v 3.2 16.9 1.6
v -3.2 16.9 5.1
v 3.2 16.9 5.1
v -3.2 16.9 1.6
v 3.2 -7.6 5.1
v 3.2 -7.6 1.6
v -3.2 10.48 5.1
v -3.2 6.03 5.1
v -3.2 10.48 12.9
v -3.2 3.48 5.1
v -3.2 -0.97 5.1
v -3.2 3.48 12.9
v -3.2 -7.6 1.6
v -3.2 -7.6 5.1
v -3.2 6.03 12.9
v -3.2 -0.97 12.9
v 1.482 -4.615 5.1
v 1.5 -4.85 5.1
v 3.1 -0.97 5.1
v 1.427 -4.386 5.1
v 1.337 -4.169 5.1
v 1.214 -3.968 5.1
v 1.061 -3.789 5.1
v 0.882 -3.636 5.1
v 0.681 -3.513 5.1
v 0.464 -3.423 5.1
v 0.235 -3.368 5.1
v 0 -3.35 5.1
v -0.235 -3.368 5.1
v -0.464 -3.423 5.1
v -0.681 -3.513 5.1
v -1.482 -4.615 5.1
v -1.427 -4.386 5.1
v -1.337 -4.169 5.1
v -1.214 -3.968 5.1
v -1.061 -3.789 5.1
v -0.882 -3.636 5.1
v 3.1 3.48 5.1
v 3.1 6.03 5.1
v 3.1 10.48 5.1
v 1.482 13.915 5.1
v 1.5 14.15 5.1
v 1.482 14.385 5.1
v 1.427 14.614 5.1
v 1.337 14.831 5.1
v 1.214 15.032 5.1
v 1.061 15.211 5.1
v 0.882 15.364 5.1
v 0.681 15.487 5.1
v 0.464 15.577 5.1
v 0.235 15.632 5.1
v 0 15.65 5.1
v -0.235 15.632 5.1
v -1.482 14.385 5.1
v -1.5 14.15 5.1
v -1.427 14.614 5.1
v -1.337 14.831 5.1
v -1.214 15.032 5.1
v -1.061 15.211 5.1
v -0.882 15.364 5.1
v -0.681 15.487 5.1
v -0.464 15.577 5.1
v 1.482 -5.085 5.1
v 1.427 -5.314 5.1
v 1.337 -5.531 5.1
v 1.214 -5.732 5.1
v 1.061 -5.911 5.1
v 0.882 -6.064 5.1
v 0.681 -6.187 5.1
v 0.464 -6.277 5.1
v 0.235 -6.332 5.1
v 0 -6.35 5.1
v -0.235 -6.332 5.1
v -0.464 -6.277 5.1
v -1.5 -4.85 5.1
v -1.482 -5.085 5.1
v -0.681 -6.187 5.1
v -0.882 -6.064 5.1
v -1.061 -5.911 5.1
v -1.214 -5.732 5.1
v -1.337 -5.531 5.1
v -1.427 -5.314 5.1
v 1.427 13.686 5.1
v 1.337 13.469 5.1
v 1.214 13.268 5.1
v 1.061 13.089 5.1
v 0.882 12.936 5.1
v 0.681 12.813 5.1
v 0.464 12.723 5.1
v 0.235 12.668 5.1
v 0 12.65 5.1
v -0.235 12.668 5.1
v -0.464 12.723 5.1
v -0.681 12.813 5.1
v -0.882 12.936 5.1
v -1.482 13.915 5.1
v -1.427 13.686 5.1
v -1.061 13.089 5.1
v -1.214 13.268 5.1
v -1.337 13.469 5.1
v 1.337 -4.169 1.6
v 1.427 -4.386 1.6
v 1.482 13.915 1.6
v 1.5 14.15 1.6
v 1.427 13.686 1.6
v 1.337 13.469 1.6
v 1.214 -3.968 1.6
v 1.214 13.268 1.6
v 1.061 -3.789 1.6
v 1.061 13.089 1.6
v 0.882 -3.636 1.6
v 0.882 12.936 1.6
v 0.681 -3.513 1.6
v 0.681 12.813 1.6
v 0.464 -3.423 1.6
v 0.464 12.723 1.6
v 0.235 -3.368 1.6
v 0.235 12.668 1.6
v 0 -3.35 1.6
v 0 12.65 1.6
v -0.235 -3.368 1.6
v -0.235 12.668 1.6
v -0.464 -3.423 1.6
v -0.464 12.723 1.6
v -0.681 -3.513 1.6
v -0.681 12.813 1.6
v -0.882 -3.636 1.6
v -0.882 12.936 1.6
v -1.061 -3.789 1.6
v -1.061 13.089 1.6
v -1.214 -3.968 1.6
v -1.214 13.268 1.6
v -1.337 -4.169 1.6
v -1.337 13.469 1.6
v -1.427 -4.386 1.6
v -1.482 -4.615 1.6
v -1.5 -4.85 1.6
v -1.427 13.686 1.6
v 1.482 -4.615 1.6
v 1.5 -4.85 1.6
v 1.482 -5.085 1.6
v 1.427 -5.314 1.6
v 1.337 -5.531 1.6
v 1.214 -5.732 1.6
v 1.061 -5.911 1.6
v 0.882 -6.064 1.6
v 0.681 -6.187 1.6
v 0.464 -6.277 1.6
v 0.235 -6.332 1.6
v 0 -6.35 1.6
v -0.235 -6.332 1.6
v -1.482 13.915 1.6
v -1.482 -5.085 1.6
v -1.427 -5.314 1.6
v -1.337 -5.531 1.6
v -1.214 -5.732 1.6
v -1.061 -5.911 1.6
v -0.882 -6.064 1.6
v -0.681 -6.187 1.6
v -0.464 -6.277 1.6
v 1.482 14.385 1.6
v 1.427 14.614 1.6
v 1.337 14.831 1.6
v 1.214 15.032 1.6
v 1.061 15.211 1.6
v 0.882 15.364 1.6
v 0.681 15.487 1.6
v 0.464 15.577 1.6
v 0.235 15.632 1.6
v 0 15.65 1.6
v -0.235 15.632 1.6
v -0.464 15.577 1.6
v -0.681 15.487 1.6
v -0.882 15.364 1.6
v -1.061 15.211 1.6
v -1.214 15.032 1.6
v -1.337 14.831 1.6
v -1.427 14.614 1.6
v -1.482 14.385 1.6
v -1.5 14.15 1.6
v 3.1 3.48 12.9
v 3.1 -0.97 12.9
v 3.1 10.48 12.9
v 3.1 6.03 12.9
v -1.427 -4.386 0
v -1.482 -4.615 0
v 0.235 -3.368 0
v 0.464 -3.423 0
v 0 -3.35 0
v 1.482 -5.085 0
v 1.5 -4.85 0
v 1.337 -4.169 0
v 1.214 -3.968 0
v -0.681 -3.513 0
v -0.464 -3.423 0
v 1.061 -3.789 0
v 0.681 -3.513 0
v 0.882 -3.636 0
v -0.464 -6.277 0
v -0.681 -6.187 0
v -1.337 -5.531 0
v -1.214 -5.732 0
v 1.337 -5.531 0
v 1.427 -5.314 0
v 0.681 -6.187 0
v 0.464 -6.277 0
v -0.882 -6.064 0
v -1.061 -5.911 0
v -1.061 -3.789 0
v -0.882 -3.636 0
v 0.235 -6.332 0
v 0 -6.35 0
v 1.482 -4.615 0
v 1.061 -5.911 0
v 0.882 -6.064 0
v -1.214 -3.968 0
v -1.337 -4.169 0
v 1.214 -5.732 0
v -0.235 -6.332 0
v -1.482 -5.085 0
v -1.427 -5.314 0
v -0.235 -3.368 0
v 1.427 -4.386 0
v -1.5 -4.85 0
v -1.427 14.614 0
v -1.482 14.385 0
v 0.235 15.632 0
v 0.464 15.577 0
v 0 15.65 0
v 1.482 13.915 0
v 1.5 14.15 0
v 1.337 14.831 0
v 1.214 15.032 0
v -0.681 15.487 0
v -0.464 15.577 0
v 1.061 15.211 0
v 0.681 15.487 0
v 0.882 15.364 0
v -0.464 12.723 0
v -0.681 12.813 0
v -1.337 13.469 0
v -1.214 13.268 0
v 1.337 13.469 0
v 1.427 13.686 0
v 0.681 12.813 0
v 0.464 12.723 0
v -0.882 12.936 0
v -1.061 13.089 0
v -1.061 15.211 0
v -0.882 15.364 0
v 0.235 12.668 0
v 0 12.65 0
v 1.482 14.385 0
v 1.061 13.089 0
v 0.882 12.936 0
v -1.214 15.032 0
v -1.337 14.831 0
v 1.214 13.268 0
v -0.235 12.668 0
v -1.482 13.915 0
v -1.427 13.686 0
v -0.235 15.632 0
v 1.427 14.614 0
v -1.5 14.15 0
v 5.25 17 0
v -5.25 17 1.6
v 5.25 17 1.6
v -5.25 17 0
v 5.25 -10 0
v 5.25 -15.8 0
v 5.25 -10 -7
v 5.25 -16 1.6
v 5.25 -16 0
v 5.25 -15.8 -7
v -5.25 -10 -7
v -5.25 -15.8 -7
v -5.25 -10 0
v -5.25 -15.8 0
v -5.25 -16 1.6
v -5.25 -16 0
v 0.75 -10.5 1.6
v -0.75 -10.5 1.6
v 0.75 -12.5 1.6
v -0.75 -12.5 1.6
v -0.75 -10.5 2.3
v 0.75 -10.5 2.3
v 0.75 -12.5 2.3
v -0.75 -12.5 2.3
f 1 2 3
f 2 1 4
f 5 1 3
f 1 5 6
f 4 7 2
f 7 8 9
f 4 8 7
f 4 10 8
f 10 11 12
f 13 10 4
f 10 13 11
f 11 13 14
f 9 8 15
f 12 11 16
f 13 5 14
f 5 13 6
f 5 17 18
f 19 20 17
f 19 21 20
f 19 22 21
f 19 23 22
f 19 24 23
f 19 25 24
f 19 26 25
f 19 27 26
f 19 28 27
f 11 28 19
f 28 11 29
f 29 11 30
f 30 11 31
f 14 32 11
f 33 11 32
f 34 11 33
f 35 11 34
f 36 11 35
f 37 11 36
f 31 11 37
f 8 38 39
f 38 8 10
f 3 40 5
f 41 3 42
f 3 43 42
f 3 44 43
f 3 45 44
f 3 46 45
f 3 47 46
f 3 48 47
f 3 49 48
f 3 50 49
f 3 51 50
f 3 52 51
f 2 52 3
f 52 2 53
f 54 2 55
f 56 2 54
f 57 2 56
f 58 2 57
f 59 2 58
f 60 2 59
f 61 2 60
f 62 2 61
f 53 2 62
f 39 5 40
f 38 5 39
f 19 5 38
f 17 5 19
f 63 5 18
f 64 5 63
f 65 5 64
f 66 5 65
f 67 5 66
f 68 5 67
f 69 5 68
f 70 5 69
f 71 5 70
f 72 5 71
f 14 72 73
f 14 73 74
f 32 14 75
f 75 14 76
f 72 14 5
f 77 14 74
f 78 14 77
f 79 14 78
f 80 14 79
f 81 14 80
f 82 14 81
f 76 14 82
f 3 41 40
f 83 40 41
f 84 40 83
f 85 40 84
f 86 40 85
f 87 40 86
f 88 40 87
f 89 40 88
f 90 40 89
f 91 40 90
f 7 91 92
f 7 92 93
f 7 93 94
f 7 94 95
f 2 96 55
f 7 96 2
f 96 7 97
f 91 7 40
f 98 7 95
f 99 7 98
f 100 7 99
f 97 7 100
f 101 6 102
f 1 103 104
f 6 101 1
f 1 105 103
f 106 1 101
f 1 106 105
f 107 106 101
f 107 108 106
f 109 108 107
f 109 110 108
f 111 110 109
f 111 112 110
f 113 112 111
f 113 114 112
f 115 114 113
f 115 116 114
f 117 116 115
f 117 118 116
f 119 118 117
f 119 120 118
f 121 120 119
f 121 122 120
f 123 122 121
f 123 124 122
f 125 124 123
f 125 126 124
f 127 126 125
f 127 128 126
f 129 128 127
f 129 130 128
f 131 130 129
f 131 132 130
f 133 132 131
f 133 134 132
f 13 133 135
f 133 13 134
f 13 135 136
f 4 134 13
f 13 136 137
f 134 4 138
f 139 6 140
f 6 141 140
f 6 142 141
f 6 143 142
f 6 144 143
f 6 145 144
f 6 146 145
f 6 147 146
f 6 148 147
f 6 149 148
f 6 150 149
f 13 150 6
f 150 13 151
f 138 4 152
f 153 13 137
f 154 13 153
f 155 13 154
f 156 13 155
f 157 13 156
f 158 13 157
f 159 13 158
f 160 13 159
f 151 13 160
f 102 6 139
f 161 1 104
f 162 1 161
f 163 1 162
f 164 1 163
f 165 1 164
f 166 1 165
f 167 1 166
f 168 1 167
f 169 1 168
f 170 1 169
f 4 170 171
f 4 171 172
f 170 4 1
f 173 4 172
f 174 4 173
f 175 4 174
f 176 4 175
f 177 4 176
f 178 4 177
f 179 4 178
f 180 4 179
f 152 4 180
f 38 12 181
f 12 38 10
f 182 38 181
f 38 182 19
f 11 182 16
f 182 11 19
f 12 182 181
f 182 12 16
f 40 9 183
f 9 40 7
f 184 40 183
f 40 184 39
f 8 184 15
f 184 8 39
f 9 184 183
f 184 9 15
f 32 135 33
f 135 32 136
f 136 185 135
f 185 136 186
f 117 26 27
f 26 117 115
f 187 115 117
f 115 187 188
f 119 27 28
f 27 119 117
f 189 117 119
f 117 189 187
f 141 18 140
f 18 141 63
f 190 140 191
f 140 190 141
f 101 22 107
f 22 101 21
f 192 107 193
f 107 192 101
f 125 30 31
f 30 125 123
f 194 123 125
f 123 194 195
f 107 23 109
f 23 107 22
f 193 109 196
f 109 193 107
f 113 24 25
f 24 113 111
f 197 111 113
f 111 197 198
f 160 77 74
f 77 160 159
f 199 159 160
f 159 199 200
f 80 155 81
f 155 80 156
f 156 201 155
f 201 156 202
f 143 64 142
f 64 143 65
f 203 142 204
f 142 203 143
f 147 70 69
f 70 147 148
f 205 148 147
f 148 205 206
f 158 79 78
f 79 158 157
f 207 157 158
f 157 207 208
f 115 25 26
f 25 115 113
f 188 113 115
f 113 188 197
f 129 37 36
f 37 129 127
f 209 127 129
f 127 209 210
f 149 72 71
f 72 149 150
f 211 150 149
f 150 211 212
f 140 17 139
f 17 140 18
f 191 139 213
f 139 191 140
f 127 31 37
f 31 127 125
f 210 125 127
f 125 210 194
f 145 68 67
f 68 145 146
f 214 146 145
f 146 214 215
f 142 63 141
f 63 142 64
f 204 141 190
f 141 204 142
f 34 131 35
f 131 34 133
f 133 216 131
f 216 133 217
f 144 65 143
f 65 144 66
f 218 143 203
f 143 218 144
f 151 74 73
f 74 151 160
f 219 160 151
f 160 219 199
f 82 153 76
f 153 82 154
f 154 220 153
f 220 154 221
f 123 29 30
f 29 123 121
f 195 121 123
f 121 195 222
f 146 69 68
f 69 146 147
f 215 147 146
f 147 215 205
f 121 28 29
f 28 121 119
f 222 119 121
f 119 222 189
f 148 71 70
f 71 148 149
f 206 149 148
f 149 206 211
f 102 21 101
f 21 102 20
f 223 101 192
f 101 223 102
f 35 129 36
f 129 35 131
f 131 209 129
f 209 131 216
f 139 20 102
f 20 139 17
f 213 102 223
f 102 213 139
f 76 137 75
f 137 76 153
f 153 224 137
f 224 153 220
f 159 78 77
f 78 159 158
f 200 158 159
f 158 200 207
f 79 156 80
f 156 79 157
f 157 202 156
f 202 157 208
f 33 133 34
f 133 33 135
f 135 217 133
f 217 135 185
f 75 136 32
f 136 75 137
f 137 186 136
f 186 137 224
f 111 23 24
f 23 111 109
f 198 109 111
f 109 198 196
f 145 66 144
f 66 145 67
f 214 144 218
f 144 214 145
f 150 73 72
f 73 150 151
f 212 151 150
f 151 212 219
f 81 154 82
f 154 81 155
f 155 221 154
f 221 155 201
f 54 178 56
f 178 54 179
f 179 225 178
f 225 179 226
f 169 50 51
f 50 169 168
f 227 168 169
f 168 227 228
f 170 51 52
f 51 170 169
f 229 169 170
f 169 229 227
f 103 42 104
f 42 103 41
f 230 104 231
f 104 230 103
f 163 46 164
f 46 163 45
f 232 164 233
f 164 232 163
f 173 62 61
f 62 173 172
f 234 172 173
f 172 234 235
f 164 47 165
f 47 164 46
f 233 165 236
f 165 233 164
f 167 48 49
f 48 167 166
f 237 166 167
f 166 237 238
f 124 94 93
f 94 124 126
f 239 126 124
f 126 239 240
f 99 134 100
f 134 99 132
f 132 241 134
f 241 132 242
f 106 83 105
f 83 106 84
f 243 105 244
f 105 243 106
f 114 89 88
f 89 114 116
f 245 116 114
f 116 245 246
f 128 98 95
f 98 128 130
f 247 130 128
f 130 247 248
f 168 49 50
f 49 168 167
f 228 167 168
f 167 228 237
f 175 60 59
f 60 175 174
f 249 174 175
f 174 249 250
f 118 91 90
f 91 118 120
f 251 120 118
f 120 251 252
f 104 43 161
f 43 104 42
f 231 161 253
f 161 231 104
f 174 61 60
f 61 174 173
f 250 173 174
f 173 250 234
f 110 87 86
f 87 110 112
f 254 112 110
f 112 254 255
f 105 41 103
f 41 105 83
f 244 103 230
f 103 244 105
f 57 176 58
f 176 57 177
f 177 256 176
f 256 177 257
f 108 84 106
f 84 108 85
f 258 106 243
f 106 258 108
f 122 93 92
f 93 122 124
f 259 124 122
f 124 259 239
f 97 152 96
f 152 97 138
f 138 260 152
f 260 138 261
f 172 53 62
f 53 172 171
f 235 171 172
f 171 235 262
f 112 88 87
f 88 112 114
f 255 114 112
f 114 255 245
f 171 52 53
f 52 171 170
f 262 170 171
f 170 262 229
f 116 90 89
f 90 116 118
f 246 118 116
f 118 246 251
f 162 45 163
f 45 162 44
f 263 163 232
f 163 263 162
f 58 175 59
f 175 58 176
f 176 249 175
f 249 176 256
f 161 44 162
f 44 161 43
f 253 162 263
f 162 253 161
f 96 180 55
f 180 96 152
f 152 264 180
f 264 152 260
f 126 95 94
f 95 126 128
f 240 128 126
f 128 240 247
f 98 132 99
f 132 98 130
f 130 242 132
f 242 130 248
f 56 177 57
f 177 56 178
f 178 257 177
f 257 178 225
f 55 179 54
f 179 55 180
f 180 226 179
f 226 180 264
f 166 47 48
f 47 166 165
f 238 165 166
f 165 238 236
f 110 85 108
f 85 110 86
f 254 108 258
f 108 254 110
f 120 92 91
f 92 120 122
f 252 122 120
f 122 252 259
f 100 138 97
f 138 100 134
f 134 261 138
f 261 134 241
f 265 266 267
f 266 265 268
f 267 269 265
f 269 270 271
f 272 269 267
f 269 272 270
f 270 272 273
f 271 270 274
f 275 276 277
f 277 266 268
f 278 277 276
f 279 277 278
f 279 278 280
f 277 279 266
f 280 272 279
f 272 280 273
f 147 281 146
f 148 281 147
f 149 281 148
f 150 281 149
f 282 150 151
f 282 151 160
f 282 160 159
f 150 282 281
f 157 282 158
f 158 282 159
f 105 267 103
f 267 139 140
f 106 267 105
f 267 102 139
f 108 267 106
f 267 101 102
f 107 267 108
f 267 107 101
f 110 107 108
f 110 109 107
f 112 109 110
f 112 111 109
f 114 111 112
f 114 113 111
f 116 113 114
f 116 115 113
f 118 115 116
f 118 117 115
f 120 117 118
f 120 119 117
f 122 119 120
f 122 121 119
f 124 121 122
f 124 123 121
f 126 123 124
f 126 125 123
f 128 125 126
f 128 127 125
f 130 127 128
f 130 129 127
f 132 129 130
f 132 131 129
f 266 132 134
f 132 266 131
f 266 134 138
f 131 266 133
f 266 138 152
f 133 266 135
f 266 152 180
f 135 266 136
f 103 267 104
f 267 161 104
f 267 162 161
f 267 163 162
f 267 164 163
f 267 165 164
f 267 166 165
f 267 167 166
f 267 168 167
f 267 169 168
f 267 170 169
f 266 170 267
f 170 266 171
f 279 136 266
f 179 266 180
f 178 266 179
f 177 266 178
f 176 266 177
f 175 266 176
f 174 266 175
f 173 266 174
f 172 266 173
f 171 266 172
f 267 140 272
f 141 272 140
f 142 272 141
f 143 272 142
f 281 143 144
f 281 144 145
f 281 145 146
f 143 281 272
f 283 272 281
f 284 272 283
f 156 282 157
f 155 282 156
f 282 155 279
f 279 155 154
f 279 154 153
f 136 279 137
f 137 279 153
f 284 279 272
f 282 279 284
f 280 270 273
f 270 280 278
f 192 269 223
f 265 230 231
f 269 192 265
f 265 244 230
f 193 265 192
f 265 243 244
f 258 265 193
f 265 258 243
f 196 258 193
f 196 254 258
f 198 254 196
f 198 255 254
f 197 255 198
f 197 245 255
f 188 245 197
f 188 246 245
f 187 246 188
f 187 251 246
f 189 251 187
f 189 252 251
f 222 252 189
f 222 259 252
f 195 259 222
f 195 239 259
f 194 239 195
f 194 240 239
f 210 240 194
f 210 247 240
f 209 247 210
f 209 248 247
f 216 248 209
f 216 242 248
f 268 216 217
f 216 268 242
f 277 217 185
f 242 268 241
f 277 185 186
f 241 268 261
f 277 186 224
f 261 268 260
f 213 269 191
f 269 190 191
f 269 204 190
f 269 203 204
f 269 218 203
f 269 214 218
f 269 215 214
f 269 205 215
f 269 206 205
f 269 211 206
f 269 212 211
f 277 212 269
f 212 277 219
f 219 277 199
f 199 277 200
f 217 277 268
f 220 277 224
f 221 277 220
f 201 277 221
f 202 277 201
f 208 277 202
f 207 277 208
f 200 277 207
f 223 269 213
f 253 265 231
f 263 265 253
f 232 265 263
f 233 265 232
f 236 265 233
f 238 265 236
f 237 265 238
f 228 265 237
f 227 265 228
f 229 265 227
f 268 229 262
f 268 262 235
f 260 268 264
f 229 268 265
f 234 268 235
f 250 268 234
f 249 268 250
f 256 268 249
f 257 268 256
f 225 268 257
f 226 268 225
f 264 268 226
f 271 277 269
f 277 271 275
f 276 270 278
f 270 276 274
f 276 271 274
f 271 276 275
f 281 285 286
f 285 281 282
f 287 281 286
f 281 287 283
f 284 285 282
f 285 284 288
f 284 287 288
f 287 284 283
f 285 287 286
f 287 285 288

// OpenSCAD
//rotate ([0,0,180]) 
opto_endstop();


module opto_endstop(){
    rotate([90,0,90])
    translate([-32/2,0,-10.5/2])
    difference(){
        union(){
            // base PCB
            color("green") cube([33.0,1.6,10.5]);
            // add the switch module
            translate([8.4,1.6,10.5/2-6.4/2]) optoswitch();
            // connector
            translate([0.2,-7,0]) color("white") cube([5.8,7,10.5]);
            // led
            translate([3.5,1.6,10.5/2-1.5/2]) color("red") cube([2,0.7,1.5]);
        }
        translate([8.4,0,10.5/2-6.4/2]) {
            for ( hole = [2.75,24.5-2.75] ){
            rotate([90,0,0]) translate([hole,6.4/2,-4]) cylinder(r=1.5, h=4.5,$fn=40);
            }
        }
    }
}

// switch module
module optoswitch() {
    difference(){
        union (){
            color("gray") cube([24.5,3.5,6.4]);
            color("gray")translate([6.63,0,0]) cube([4.45,11.3,6.3]);
            color("gray")translate([13.63,0,0]) cube([4.45,11.3,6.3]);
        }
        for ( hole = [2.75,24.5-2.75] ){
            rotate([90,0,0]) translate([hole,6.4/2,-4]) cylinder(r=1.5, h=4.5,$fn=40);
        }	
    }
}
